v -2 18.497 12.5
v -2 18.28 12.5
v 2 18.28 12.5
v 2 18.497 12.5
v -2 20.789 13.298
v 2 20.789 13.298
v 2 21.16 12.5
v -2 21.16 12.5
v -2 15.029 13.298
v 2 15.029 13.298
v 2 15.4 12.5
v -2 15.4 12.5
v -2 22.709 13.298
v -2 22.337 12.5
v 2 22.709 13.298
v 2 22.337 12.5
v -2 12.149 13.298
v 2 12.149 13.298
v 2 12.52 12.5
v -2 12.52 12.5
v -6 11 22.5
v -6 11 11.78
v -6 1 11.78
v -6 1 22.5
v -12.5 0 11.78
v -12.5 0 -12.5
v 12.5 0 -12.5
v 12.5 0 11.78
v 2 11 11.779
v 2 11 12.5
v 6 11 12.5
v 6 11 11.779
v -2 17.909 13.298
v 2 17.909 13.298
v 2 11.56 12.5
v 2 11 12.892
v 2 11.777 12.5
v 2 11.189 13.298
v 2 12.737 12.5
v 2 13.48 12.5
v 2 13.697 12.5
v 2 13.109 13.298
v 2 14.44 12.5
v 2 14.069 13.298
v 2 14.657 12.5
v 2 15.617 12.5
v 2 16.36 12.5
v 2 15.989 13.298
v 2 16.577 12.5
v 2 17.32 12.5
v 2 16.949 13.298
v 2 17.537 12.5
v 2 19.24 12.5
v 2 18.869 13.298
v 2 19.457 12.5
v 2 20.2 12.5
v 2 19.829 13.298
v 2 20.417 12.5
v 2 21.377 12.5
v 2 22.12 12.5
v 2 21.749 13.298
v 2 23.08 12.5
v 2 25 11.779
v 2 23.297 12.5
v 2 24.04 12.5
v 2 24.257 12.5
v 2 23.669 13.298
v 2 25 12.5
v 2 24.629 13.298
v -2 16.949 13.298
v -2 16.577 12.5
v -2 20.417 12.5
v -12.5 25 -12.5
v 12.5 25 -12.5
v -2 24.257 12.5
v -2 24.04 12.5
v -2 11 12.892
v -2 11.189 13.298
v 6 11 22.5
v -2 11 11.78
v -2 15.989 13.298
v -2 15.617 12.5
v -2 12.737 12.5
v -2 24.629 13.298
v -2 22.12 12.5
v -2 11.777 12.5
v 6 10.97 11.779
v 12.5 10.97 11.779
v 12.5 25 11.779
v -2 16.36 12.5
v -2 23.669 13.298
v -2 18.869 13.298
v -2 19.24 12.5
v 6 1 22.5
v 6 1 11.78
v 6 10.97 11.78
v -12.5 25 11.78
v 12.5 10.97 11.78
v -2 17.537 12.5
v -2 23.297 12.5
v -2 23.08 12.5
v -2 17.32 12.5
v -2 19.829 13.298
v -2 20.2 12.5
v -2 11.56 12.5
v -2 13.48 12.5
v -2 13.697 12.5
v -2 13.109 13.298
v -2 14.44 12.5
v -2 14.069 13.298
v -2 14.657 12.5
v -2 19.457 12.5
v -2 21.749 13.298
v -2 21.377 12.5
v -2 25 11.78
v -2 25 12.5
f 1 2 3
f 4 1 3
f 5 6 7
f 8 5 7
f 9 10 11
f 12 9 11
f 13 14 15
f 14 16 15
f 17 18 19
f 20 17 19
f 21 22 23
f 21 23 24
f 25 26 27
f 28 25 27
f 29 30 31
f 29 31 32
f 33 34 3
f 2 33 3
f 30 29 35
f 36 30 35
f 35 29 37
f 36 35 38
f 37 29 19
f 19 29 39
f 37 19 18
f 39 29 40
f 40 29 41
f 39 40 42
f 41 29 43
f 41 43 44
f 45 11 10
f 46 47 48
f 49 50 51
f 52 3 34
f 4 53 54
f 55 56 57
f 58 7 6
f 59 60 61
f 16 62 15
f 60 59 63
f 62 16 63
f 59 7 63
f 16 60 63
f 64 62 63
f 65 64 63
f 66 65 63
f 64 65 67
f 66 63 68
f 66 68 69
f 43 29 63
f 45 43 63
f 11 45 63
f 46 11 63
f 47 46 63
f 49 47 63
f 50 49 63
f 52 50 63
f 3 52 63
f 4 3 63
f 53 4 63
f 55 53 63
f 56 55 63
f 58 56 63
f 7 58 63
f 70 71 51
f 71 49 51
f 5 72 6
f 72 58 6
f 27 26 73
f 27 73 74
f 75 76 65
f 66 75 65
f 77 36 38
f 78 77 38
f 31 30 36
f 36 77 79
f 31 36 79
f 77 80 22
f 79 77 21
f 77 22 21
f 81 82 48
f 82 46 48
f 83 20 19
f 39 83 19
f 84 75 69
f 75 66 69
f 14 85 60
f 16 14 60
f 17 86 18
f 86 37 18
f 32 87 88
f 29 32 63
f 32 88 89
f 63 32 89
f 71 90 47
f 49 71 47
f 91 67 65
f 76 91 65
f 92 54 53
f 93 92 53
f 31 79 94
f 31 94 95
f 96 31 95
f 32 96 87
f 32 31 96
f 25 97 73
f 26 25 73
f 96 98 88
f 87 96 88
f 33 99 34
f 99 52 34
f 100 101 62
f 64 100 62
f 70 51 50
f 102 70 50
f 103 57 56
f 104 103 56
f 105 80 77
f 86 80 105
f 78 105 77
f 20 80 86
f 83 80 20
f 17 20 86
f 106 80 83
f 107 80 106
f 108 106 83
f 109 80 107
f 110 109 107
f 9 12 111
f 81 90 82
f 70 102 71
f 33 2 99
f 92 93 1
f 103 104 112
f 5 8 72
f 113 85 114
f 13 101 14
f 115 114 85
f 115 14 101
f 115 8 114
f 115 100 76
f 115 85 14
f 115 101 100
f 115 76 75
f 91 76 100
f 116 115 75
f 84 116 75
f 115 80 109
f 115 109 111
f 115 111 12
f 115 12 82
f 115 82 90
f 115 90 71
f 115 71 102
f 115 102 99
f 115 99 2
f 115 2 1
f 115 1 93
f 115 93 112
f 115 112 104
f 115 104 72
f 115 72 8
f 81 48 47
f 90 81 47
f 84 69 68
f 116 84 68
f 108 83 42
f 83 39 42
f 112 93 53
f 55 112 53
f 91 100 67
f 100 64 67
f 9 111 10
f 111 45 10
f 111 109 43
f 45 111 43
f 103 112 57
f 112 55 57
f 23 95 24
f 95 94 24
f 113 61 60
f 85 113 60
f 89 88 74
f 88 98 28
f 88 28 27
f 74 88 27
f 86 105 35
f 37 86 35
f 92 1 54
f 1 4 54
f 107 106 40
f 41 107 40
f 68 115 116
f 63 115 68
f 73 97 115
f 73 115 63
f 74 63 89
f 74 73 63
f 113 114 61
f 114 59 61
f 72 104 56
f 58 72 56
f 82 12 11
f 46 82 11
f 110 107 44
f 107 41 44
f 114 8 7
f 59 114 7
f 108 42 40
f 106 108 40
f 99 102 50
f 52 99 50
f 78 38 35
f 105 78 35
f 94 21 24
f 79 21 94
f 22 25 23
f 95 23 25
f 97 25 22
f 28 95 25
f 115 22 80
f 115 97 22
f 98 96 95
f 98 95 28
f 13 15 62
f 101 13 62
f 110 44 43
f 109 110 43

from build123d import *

# Parameters (mm, degrees)
SKETCH1_W           = 25
SKETCH1_H           = 25
BOSS_EXTRUDE1_DEPTH = 25
SKETCH2_W           = 12
SKETCH2_H           = 10
BOSS_EXTRUDE2_DEPTH = 10
BOSS_EXTRUDE4_DEPTH = 2
LPATTERN1_COUNT     = 15
LPATTERN1_PITCH     = 0.96
CUT_EXTRUDE1_REACH  = 43.908
SKETCH4_W           = 0.720746126
SKETCH4_H           = 14.030445764
SKETCH5_W           = 10.5
SKETCH5_H           = 0.72
CUT_EXTRUDE2_DEPTH  = 14.3
CUT_EXTRUDE3_DEPTH  = 0.72
BOSS_EXTRUDE5_REACH = 40.386
SKETCH8_W           = 0.72
SKETCH8_H           = 0.3
SKETCH10_W          = 0.720746126
SKETCH10_H          = 0.030490047
BOSS_EXTRUDE6_DEPTH = 4


with BuildPart() as part:
    # Sketch1 → Boss-Extrude1 (new body)
    with BuildSketch(Plane(origin=(0, 0, 0), x_dir=(1, 0, 0), z_dir=(0, 1, 0))):
        Rectangle(SKETCH1_W, SKETCH1_H)
    extrude(amount=BOSS_EXTRUDE1_DEPTH)

    # Sketch2 → Boss-Extrude2 (add)
    with BuildSketch(Plane.XY.offset(12.5)):
        with Locations((0, 6)):
            Rectangle(SKETCH2_W, SKETCH2_H)
    extrude(amount=BOSS_EXTRUDE2_DEPTH)

    # Sketch3 → Boss-Extrude4 (add, symmetric)
    with BuildSketch(Plane(origin=(0, 0, 0), x_dir=(0, 0, -1), z_dir=(1, 0, 0))):
        Polygon((-12.5, 25), (-12.5, 24.2574888), (-13.297852918, 24.6287444), align=None)
    boss_extrude4 = extrude(amount=BOSS_EXTRUDE4_DEPTH, both=True)

    # LPattern1: Boss-Extrude4 ×15
    with Locations(*[(0, -i * LPATTERN1_PITCH, 0) for i in range(1, LPATTERN1_COUNT)]):
        add(boss_extrude4)

    # Cut-Extrude1: up to this face of the body (flat: up to its plane)
    cut_extrude1_end = Plane(part.part.faces().sort_by_distance((2, 24.6287444, 12.765950973))[0])
    # Sketch4 → Cut-Extrude1 (cut, up to the picked face)
    with BuildSketch(Plane(origin=(12.5, 0, 0), x_dir=(0, 0, -1), z_dir=(1, 0, 0)), mode=Mode.PRIVATE) as cut_extrude1_sk1:
        with Locations((-12.139626937, 17.984777118)):
            Rectangle(SKETCH4_W, SKETCH4_H)
    cut_extrude1_tool1 = split(extrude(cut_extrude1_sk1.sketch, amount=-CUT_EXTRUDE1_REACH, mode=Mode.PRIVATE), bisect_by=cut_extrude1_end, keep=Keep.BOTH, mode=Mode.PRIVATE)
    add(cut_extrude1_tool1.solids().sort_by(Axis((12.5, 17.984777, 12.139627), (-1, 0, 0)))[0], mode=Mode.SUBTRACT)

    # Sketch5 → Cut-Extrude2 (cut)
    with BuildSketch(Plane(origin=(0, 25, 0), x_dir=(1, 0, 0), z_dir=(0, 1, 0))):
        with Locations((-7.25, -12.14)):
            Rectangle(SKETCH5_W, SKETCH5_H)
    extrude(amount=-CUT_EXTRUDE2_DEPTH, mode=Mode.SUBTRACT)

    # Sketch7 → Cut-Extrude3 (cut)
    with BuildSketch(Plane.XY.offset(12.5)):
        Polygon((-6, 10.7), (-12.5, 10.7), (-12.5, 0), (12.5, 0), (12.5, 10.969554236), (6, 10.969554236), (6, 1), (-6, 1), align=None)
    extrude(amount=-CUT_EXTRUDE3_DEPTH, mode=Mode.SUBTRACT)

    # Sketch8 → Boss-Extrude5 (add, up to next)
    with BuildSketch(Plane.ZY.offset(6), mode=Mode.PRIVATE) as boss_extrude5_sk1:
        with Locations((12.14, 10.85)):
            Rectangle(SKETCH8_W, SKETCH8_H)
    boss_extrude5_tool1 = extrude(boss_extrude5_sk1.sketch, amount=-BOSS_EXTRUDE5_REACH, mode=Mode.PRIVATE) - part.part
    add(boss_extrude5_tool1.solids().sort_by_distance((-6, 10.85, 12.14))[0])

    # Sketch10 → Boss-Extrude6 (add)
    with BuildSketch(Plane(origin=(2, 0, 0), x_dir=(0, 0, -1), z_dir=(1, 0, 0))):
        with Locations((-12.139626937, 10.98479926)):
            Rectangle(SKETCH10_W, SKETCH10_H)
    extrude(amount=BOSS_EXTRUDE6_DEPTH)


solid = part.part
